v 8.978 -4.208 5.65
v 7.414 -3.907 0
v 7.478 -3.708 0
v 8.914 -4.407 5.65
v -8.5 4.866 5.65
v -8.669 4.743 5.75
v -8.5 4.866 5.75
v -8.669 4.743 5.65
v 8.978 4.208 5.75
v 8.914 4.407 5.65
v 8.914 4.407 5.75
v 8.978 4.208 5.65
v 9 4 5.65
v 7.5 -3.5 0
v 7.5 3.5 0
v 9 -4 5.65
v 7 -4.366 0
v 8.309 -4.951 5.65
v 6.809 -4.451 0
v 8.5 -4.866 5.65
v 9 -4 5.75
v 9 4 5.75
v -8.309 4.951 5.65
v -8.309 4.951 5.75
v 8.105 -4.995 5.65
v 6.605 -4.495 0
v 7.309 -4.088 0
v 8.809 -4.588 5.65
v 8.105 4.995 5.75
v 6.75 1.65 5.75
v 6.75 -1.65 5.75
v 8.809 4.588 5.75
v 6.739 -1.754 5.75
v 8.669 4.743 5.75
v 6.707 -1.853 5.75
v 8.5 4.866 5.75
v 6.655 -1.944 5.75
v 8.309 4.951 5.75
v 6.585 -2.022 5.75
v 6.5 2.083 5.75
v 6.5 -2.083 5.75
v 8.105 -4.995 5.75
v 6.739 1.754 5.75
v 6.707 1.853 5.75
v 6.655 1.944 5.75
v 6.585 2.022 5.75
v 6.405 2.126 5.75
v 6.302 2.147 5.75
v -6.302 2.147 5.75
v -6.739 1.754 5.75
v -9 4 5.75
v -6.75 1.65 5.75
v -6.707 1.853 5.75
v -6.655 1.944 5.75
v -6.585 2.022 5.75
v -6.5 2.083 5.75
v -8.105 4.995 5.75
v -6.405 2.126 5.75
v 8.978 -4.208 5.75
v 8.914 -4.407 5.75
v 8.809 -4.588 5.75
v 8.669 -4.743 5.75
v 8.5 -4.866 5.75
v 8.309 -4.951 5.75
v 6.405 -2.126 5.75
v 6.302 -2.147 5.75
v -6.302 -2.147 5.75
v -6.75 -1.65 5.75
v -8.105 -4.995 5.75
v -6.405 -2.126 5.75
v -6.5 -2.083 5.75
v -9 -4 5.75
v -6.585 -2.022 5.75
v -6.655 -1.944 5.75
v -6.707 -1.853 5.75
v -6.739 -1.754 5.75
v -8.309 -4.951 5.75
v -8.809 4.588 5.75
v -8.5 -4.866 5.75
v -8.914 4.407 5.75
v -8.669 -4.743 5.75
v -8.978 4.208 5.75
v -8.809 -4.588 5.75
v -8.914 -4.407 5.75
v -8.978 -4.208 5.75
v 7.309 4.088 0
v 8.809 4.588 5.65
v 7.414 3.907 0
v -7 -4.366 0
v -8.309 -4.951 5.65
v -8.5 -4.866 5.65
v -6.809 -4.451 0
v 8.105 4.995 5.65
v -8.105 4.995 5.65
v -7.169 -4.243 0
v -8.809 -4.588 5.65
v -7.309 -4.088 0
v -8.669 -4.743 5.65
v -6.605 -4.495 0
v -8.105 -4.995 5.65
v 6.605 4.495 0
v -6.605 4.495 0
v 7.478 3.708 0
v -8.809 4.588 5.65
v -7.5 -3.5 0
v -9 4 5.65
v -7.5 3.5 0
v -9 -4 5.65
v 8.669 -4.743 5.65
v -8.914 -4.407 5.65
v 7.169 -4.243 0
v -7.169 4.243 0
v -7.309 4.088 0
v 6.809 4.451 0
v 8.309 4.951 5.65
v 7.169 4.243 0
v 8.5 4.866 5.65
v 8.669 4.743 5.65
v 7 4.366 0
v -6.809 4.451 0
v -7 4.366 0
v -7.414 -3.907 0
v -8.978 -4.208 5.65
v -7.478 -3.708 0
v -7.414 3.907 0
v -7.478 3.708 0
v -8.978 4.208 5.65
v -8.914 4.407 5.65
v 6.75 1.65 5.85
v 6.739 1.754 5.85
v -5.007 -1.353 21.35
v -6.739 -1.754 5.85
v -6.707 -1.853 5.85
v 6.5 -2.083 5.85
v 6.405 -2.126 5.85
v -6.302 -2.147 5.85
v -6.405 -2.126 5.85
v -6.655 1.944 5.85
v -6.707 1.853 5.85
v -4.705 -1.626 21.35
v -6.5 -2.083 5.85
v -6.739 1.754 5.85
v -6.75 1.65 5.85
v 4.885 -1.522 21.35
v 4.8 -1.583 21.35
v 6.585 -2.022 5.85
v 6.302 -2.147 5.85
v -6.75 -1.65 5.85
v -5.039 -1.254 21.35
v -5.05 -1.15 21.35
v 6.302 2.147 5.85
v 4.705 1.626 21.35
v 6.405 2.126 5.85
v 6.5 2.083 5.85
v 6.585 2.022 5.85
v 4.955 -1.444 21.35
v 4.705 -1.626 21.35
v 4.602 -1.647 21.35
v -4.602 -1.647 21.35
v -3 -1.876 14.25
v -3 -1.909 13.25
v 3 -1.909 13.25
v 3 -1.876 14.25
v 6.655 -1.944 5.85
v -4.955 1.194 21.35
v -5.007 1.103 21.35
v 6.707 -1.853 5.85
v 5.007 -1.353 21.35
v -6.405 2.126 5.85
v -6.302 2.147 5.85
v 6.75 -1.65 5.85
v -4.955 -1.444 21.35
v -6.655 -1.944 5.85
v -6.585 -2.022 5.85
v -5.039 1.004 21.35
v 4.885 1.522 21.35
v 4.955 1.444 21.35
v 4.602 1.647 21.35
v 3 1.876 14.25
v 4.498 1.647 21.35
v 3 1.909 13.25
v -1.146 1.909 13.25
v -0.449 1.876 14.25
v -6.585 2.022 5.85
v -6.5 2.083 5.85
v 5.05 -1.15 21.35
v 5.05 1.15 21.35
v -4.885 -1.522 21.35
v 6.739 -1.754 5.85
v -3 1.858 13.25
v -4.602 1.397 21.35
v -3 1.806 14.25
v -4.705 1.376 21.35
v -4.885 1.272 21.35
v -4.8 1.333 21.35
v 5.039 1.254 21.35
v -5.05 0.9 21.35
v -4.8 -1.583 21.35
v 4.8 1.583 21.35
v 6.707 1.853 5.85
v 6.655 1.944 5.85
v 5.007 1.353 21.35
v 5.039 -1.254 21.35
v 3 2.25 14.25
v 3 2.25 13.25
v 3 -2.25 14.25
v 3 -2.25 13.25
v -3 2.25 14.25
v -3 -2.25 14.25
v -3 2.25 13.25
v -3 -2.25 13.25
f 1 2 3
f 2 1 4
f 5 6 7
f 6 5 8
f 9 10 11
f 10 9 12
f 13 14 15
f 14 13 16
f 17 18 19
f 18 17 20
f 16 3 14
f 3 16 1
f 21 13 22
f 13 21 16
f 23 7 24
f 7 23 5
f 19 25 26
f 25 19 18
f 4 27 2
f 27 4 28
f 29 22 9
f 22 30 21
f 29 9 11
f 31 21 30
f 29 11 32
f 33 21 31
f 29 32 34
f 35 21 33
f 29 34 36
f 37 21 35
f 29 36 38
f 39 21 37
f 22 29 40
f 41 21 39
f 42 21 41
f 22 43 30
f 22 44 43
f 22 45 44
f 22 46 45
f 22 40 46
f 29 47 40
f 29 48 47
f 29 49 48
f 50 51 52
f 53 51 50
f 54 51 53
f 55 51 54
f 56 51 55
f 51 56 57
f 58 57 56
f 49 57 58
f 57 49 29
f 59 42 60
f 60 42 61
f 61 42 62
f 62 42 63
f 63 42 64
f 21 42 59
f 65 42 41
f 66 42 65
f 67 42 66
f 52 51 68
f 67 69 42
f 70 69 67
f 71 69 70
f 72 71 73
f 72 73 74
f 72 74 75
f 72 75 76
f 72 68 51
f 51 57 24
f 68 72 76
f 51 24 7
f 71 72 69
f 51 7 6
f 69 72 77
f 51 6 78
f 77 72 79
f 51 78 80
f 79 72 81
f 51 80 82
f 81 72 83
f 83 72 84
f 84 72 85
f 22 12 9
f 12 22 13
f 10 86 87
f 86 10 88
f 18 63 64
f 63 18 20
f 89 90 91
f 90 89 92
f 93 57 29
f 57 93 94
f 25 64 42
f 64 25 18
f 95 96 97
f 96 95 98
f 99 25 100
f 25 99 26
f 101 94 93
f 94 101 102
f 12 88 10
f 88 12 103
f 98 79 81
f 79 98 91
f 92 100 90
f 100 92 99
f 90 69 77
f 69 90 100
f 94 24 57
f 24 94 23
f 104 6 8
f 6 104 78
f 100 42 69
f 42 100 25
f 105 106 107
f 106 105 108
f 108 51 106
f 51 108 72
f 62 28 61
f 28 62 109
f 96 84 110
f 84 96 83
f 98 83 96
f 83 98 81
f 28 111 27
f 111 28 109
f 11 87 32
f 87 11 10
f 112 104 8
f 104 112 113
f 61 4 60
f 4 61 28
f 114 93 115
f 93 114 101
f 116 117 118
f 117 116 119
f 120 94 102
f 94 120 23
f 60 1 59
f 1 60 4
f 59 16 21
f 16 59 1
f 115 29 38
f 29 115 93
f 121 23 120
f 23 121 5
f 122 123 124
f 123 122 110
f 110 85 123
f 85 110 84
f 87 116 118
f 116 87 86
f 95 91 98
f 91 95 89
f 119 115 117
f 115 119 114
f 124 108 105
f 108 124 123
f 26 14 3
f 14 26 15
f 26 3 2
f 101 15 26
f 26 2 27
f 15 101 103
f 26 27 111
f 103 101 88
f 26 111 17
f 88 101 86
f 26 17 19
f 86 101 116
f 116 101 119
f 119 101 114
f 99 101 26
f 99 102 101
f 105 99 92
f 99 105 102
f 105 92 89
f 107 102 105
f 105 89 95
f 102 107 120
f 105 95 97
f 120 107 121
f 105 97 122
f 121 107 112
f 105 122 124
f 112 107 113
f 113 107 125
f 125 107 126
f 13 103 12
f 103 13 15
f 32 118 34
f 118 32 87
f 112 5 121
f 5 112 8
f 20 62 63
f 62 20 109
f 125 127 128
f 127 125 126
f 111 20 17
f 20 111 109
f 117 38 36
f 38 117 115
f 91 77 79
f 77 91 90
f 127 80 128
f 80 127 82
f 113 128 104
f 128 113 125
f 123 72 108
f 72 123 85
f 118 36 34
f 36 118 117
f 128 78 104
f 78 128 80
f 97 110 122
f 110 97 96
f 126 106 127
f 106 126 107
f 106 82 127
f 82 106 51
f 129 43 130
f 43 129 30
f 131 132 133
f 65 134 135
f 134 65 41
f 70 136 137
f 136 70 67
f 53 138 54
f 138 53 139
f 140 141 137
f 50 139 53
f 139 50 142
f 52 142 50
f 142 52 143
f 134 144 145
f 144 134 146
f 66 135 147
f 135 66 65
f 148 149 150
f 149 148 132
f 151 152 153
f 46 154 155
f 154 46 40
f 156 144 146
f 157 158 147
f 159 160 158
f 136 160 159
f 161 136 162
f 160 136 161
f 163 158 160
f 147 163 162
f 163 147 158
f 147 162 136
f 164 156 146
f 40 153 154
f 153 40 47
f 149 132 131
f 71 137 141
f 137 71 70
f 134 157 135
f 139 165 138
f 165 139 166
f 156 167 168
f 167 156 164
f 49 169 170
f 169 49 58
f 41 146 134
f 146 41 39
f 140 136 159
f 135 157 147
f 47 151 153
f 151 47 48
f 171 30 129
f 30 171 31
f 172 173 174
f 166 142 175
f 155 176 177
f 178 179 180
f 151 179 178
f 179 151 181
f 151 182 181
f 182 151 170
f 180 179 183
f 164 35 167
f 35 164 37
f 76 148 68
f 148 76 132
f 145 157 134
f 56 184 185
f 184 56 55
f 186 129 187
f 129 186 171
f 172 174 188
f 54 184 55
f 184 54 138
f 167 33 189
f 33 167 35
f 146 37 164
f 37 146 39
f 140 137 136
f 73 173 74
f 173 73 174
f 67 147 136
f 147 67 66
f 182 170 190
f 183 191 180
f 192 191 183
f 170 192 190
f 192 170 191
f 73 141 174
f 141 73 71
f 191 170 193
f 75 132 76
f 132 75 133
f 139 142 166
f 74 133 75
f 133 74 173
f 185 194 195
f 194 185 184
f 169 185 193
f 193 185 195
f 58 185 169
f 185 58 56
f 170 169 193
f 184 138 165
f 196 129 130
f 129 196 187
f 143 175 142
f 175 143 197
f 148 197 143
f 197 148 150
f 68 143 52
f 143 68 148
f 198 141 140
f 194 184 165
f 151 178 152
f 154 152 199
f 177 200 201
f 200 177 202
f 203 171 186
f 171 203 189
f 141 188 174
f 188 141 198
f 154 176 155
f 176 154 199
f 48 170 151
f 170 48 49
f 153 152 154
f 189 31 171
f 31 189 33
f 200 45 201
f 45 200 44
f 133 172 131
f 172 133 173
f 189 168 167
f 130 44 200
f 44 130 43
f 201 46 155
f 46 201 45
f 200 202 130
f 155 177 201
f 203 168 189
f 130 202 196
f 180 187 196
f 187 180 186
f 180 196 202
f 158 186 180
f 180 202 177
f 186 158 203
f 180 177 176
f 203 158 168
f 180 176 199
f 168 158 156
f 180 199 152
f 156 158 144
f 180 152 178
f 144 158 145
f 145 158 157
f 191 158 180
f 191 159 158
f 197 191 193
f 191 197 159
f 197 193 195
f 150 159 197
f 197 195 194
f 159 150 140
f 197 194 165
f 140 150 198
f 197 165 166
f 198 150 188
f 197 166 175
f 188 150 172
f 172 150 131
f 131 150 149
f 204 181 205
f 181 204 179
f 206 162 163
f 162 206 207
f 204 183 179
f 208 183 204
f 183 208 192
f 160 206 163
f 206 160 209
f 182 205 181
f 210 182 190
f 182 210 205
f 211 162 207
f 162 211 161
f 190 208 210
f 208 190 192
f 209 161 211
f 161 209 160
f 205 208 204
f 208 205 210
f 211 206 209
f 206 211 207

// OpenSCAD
//millimeters

radius=1;
radius2=.5;
x=14;
x1=17;
y=8;
y1=9;
keyx=13;
keyx1=9.6;
keyy=3.8;
keyy1=2.8;

res=30;

module front(){
linear_extrude(.1){
hull()
{
    translate([(-x/2)+(radius/2), (-y/2)+(radius/2), 0])
    circle(r=radius, $fn=res);

    translate([(x/2)-(radius/2), (-y/2)+(radius/2), 0])
    circle(r=radius, $fn=res);

    translate([(-x/2)+(radius/2), (y/2)-(radius/2), 0])
    circle(r=radius, $fn=res);

    translate([(x/2)-(radius/2), (y/2)-(radius/2), 0])
    circle(r=radius, $fn=res);
        }
    }   
}

module step(){
linear_extrude(.1){
hull()
{
    translate([(-x1/2)+(radius/2), (-y1/2)+(radius/2), 0])
    circle(r=radius, $fn=res);

    translate([(x1/2)-(radius/2), (-y1/2)+(radius/2), 0])
    circle(r=radius, $fn=res);

    translate([(-x1/2)+(radius/2), (y1/2)-(radius/2), 0])
    circle(r=radius, $fn=res);

    translate([(x1/2)-(radius/2), (y1/2)-(radius/2), 0])
    circle(r=radius, $fn=res);
        }
    }
}

module key1(){
linear_extrude(.1){
hull()
{
    translate([(-keyx/2)+(radius2/2), (-keyy/2)+(radius2/2), 0])
    circle(r=radius2, $fn=res);

    translate([(keyx/2)-(radius2/2), (-keyy/2)+(radius2/2), 0])
    circle(r=radius2, $fn=res);

    translate([(-keyx/2)+(radius2/2), (keyy/2)-(radius2/2), 0])
    circle(r=radius2, $fn=res);

    translate([(keyx/2)-(radius2/2), (keyy/2)-(radius2/2), 0])
    circle(r=radius2, $fn=res);
        }
    }
}

module key2(){
linear_extrude(.1){
hull()
{
    translate([(-keyx1/2)+(radius2/2), (-keyy1/2)+(radius2/2), 0])
    circle(r=radius2, $fn=res);

    translate([(keyx1/2)-(radius2/2), (-keyy1/2)+(radius2/2), 0])
    circle(r=radius2, $fn=res);

    translate([(-keyx1/2)+(radius2/2), (keyy1/2)-(radius/2), 0])
    circle(r=radius2, $fn=res);

    translate([(keyx1/2)-(radius2/2), (keyy1/2)-(radius2/2), 0])
    circle(r=radius2, $fn=res);
        }
    }
}

module base(){
hull(){
    front();
    translate([0,0,5.65]) step();
}
}

module keys(){
    hull(){
    key1();
    translate([0,0,15.5]) key2();
}
}


module pin(){
    cube([6,4.5,1], center=true);
}
union(){
    base();
    translate([0,0,5.75]) keys();
    translate([0,0,8+5.75]) pin();
}
